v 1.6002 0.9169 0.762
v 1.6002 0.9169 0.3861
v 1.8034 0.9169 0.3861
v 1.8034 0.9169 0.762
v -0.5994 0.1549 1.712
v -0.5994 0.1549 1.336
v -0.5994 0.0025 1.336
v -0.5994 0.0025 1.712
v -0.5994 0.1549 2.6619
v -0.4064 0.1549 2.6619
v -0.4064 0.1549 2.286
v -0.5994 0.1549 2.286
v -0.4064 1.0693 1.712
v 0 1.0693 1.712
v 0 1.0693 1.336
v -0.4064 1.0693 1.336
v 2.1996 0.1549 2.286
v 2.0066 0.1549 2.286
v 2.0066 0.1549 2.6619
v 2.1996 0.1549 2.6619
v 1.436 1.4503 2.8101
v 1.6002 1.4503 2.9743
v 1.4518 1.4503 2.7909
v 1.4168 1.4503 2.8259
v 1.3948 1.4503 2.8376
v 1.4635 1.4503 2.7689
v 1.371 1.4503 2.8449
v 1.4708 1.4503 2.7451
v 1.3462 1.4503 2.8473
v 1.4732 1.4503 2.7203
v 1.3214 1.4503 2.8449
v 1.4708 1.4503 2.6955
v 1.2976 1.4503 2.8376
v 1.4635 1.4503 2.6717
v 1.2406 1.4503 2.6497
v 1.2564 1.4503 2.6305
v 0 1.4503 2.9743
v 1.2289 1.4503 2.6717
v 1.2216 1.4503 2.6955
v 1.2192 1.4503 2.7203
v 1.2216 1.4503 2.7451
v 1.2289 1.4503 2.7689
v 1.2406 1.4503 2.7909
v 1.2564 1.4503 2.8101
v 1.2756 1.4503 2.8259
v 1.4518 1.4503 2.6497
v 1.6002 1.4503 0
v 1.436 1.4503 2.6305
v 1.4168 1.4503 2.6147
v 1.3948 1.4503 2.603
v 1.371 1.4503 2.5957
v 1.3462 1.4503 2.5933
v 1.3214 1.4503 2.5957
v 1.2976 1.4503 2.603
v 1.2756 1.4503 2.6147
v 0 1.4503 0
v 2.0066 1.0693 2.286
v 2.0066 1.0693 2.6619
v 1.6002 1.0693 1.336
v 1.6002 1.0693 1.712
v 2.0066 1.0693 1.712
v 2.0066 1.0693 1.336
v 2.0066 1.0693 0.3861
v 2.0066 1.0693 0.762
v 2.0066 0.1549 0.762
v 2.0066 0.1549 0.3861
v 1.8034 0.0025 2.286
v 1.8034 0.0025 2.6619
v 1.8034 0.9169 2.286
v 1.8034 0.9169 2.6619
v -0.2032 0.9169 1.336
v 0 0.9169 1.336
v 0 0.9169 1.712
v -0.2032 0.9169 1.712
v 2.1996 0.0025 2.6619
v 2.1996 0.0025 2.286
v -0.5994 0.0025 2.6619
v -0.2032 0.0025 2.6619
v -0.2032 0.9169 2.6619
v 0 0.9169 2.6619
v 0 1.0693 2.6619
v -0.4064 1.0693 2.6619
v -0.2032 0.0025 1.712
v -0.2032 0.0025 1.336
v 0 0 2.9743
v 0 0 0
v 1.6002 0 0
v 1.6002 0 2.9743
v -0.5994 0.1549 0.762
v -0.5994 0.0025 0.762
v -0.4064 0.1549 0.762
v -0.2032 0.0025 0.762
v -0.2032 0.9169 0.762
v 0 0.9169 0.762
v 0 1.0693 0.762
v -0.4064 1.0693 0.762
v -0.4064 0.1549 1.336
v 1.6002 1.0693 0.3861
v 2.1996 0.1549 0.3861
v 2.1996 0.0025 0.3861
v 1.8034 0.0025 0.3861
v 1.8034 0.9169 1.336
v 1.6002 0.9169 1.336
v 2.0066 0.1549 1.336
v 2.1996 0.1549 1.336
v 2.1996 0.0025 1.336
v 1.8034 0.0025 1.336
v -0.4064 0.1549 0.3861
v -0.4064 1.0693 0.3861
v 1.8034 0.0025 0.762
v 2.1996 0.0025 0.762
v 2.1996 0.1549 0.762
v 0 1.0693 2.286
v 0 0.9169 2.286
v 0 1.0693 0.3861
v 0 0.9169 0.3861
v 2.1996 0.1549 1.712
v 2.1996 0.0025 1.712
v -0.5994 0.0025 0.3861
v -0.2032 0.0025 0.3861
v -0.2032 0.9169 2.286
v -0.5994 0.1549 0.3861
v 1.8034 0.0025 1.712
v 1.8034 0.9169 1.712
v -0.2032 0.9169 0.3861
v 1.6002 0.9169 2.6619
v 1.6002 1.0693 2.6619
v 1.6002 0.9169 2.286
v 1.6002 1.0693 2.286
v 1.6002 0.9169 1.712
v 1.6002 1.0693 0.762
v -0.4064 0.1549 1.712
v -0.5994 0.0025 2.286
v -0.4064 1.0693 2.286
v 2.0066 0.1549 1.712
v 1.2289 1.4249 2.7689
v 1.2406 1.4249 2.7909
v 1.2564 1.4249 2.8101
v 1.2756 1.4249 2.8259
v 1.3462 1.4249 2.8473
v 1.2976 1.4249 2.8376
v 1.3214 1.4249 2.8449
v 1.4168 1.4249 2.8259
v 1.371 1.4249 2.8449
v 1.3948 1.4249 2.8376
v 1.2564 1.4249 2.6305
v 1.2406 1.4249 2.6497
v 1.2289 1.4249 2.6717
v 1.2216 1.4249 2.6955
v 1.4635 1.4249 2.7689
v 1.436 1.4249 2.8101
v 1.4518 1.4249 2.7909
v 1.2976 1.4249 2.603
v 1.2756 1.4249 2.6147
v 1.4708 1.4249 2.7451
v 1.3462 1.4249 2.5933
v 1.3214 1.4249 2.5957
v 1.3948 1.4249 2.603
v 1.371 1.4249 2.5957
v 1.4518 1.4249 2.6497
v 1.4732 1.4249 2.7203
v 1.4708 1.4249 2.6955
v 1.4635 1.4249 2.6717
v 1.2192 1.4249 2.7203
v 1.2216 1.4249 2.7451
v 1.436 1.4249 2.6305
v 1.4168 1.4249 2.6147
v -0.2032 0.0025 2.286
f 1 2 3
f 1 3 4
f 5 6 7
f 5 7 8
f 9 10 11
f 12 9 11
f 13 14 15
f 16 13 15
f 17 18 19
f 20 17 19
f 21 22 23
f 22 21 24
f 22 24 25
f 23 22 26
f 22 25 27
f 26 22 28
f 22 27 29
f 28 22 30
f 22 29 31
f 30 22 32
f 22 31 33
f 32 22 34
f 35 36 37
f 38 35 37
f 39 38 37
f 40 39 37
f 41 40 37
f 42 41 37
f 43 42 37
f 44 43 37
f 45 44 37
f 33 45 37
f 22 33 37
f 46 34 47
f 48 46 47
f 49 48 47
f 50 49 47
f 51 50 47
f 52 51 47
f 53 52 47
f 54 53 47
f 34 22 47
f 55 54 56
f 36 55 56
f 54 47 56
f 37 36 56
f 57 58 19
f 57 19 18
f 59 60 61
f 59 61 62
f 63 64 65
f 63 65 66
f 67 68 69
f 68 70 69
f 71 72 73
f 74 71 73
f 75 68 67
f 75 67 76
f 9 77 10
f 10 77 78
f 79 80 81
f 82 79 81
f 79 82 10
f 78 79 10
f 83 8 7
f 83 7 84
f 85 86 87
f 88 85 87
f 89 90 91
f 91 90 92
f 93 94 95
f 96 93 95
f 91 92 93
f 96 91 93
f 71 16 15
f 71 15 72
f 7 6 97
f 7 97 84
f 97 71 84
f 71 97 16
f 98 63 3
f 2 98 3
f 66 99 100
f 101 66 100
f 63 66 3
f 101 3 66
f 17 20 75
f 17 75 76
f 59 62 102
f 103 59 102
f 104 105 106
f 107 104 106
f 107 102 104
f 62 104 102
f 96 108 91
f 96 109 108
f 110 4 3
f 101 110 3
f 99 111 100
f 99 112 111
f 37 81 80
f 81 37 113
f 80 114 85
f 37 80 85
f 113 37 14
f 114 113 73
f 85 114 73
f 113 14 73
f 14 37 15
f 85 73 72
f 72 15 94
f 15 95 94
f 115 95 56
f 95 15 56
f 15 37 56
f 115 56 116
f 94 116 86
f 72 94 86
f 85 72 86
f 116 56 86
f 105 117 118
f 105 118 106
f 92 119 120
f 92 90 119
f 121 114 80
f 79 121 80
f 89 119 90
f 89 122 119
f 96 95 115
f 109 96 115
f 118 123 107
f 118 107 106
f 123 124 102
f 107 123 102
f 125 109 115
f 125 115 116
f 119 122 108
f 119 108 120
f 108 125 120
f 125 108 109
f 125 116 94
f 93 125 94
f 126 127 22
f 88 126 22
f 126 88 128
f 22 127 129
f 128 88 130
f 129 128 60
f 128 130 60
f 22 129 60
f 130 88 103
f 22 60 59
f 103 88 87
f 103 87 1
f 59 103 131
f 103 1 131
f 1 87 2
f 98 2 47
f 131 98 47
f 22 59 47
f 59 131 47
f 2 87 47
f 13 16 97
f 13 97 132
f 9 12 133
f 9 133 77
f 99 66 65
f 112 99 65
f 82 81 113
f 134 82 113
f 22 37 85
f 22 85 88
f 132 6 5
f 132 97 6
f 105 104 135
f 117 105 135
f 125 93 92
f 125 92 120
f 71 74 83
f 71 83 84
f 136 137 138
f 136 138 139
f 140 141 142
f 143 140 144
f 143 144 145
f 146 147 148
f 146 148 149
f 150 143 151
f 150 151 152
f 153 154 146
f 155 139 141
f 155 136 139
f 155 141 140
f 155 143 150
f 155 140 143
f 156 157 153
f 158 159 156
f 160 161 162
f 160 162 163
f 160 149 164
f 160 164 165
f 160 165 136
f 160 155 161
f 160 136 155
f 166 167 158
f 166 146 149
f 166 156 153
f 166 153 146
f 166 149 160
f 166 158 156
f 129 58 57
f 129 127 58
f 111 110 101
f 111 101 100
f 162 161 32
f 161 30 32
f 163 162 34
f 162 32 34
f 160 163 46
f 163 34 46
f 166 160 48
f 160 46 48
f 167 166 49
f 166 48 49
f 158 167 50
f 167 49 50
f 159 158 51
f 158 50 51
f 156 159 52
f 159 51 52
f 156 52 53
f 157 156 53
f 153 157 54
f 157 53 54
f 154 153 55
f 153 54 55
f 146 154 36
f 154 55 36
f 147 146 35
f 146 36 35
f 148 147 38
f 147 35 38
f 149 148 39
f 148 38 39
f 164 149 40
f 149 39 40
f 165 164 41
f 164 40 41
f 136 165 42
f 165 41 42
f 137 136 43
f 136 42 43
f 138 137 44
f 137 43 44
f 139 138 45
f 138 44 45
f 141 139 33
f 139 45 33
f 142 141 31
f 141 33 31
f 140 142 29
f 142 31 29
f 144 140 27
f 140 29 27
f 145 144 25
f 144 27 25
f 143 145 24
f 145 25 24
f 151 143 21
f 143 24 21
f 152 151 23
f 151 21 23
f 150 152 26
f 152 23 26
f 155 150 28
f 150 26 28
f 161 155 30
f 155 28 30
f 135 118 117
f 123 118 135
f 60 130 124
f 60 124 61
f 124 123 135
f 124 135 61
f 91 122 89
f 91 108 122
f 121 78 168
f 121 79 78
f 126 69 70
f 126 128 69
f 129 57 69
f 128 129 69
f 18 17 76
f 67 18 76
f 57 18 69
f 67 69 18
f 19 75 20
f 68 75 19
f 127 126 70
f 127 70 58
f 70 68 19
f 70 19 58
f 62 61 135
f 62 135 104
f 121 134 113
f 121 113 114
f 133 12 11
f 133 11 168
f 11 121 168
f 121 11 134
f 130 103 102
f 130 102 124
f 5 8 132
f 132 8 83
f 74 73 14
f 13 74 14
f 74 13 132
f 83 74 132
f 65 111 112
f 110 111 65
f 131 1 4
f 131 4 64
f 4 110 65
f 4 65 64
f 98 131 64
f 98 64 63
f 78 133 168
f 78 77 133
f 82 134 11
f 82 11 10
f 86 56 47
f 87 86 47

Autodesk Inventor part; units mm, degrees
ref_plane "YZ Plane" through (0, 0, 0) normal (1, 0, 0) x (0, 1, 0)
ref_plane "XZ Plane" through (0, 0, 0) normal (0, 1, 0) x (-1, 0, 0)
ref_plane "XY Plane" through (0, 0, 0) normal (0, 0, 1) x (1, 0, 0)
sketch "Sketch1" plane through (0, 0, 0) normal (0, 0, 1) x (1, 0, 0)
  line L0 (0, 0) -> (1.6002, 0)
  line L1 (1.6002, 0) -> (1.6002, 1.4503)
  line L2 (1.6002, 1.4503) -> (0, 1.4503)
  line L3 (0, 1.4503) -> (0, 0)
  dimension "d0" = 1.6002
  dimension "d1" = 1.4503
extrude "Extrusion1" add sketch "Sketch1" along normal blind 2.9743
sketch "Sketch2" plane through (1.6002, 0, 0) normal (1, 0, 0) x (0, 0, -1)
  line L0 (-2.6619, 1.0693) -> (-2.286, 1.0693)
  line L1 (-2.286, 1.0693) -> (-2.286, 0.9169)
  line L2 (-2.286, 0.9169) -> (-2.6619, 0.9169)
  line L3 (-2.6619, 0.9169) -> (-2.6619, 1.0693)
  line L4 (0, 1.4503) -> (-2.9743, 1.4503) projected
  line L5 (-2.9743, 0) -> (-2.9743, 1.4503) projected
  line L6 (-1.712, 1.0693) -> (-1.336, 1.0693)
  line L7 (-1.336, 1.0693) -> (-1.336, 0.9169)
  line L8 (-1.336, 0.9169) -> (-1.712, 0.9169)
  line L9 (-1.712, 0.9169) -> (-1.712, 1.0693)
  line L10 (-0.762, 1.0693) -> (-0.3861, 1.0693)
  line L11 (-0.3861, 1.0693) -> (-0.3861, 0.9169)
  line L12 (-0.3861, 0.9169) -> (-0.762, 0.9169)
  line L13 (-0.762, 0.9169) -> (-0.762, 1.0693)
  point P0 (0, 0)
  dimension "d4" = 0.1524
  dimension "d5" = 0.3759
  dimension "d6" = 0.381
  dimension "d7" = 0.3124
  dimension "d10" = 0.95
extrude "Extrusion2" add sketch "Sketch2" along normal blind 0.254
extrude "Extrusion3" add sketch "Sketch2" against normal blind 1.8542
sketch "Sketch3" plane through (1.8542, 0, 0) normal (1, 0, 0) x (0, 0, -1)
  line L0 (-2.6619, 0.9169) -> (-2.286, 0.9169)
  line L1 (-2.286, 0.9169) -> (-2.286, 1.0693)
  line L2 (-2.286, 1.0693) -> (-2.6619, 1.0693)
  line L3 (-2.6619, 1.0693) -> (-2.6619, 0.9169)
  line L4 (-1.712, 0.9169) -> (-1.336, 0.9169)
  line L5 (-1.336, 0.9169) -> (-1.336, 1.0693)
  line L6 (-1.336, 1.0693) -> (-1.712, 1.0693)
  line L7 (-1.712, 1.0693) -> (-1.712, 0.9169)
  line L8 (-0.762, 0.9169) -> (-0.3861, 0.9169)
  line L9 (-0.3861, 0.9169) -> (-0.3861, 1.0693)
  line L10 (-0.3861, 1.0693) -> (-0.762, 1.0693)
  line L11 (-0.762, 1.0693) -> (-0.762, 0.9169)
  point P0 (0, 0)
extrude "Extrusion4" add sketch "Sketch3" along normal blind 0.1524
sketch "Sketch4" plane through (-0.254, 0, 0) normal (-1, 0, 0) x (0, 0, 1)
  line L0 (2.286, 1.0693) -> (2.6619, 1.0693)
  line L1 (2.6619, 1.0693) -> (2.6619, 0.9169)
  line L2 (2.6619, 0.9169) -> (2.286, 0.9169)
  line L3 (2.286, 0.9169) -> (2.286, 1.0693)
  line L4 (1.712, 1.0693) -> (1.336, 1.0693)
  line L5 (1.336, 1.0693) -> (1.336, 0.9169)
  line L6 (1.336, 0.9169) -> (1.712, 0.9169)
  line L7 (1.712, 0.9169) -> (1.712, 1.0693)
  line L8 (0.762, 1.0693) -> (0.3861, 1.0693)
  line L9 (0.3861, 1.0693) -> (0.3861, 0.9169)
  line L10 (0.3861, 0.9169) -> (0.762, 0.9169)
  line L11 (0.762, 0.9169) -> (0.762, 1.0693)
  point P0 (0, 0)
extrude "Extrusion5" add sketch "Sketch4" along normal blind 0.1524
sketch "Sketch5" plane through (0, 0.9169, 2.286) normal (0, -1, 0) x (1, 0, 0)
  line L0 (0, 0) -> (-0.4064, 0) projected
  line L1 (-0.4064, 0.3759) -> (-0.2032, 0.3759)
  line L2 (-0.2032, 0.3759) -> (-0.2032, 0)
  line L3 (-0.2032, 0) -> (-0.4064, 0)
  line L4 (-0.4064, 0) -> (-0.4064, 0.3759)
  line L5 (0, -0.95) -> (-0.4064, -0.95) projected
  line L6 (-0.4064, -0.574) -> (-0.2032, -0.574)
  line L7 (-0.2032, -0.574) -> (-0.2032, -0.95)
  line L8 (-0.2032, -0.95) -> (-0.4064, -0.95)
  line L9 (-0.4064, -0.95) -> (-0.4064, -0.574)
  line L10 (0, -1.8999) -> (-0.4064, -1.8999) projected
  line L11 (-0.4064, -1.524) -> (-0.2032, -1.524)
  line L12 (-0.2032, -1.524) -> (-0.2032, -1.8999)
  line L13 (-0.2032, -1.8999) -> (-0.4064, -1.8999)
  line L14 (-0.4064, -1.8999) -> (-0.4064, -1.524)
  line L15 (1.6002, 0) -> (2.0066, 0) projected
  line L16 (2.0066, 0.3759) -> (1.8034, 0.3759)
  line L17 (1.8034, 0.3759) -> (1.8034, 0)
  line L18 (1.8034, 0) -> (2.0066, 0)
  line L19 (2.0066, 0) -> (2.0066, 0.3759)
  line L20 (2.0066, -0.574) -> (1.8034, -0.574)
  line L21 (1.8034, -0.574) -> (1.8034, -0.95)
  line L22 (1.8034, -0.95) -> (2.0066, -0.95)
  line L23 (2.0066, -0.95) -> (2.0066, -0.574)
  line L24 (1.6002, -1.8999) -> (2.0066, -1.8999) projected
  line L25 (2.0066, -1.524) -> (1.8034, -1.524)
  line L26 (1.8034, -1.524) -> (1.8034, -1.8999)
  line L27 (1.8034, -1.8999) -> (2.0066, -1.8999)
  line L28 (2.0066, -1.8999) -> (2.0066, -1.524)
  point P0 (0, -2.286)
extrude "Extrusion6" add sketch "Sketch5" along normal blind 0.9144
sketch "Sketch6" plane through (2.0066, 0, 0) normal (1, 0, 0) x (0, 0, -1)
  line L0 (-2.286, 0.9169) -> (-2.286, 0.0025) projected
  line L1 (-2.6619, 0.0025) -> (-2.286, 0.0025)
  line L2 (-2.286, 0.0025) -> (-2.286, 0.1549)
  line L3 (-2.286, 0.1549) -> (-2.6619, 0.1549)
  line L4 (-2.6619, 0.1549) -> (-2.6619, 0.0025)
  line L5 (-1.336, 1.0693) -> (-1.336, 0.0025) projected
  line L6 (-1.712, 0.0025) -> (-1.336, 0.0025)
  line L7 (-1.336, 0.0025) -> (-1.336, 0.1549)
  line L8 (-1.336, 0.1549) -> (-1.712, 0.1549)
  line L9 (-1.712, 0.1549) -> (-1.712, 0.0025)
  line L10 (-0.3861, 1.0693) -> (-0.3861, 0.0025) projected
  line L11 (-0.762, 0.0025) -> (-0.3861, 0.0025)
  line L12 (-0.3861, 0.0025) -> (-0.3861, 0.1549)
  line L13 (-0.3861, 0.1549) -> (-0.762, 0.1549)
  line L14 (-0.762, 0.1549) -> (-0.762, 0.0025)
  point P0 (0, 0)
  dimension "d25" = 0.1524
extrude "Extrusion7" add sketch "Sketch6" along normal blind 0.193
sketch "Sketch7" plane through (-0.4064, 0, 0) normal (-1, 0, 0) x (0, 0, 1)
  line L0 (2.286, 0.0025) -> (2.6619, 0.0025)
  line L1 (2.6619, 0.0025) -> (2.6619, 0.1549)
  line L2 (2.6619, 0.1549) -> (2.286, 0.1549)
  line L3 (2.286, 0.1549) -> (2.286, 0.0025)
  line L4 (1.712, 0.0025) -> (1.336, 0.0025)
  line L5 (1.336, 0.0025) -> (1.336, 0.1549)
  line L6 (1.336, 0.1549) -> (1.712, 0.1549)
  line L7 (1.712, 0.1549) -> (1.712, 0.0025)
  line L8 (0.762, 0.0025) -> (0.3861, 0.0025)
  line L9 (0.3861, 0.0025) -> (0.3861, 0.1549)
  line L10 (0.3861, 0.1549) -> (0.762, 0.1549)
  line L11 (0.762, 0.1549) -> (0.762, 0.0025)
  point P0 (0, 0)
extrude "Extrusion8" add sketch "Sketch7" along normal blind 0.193
sketch "Sketch8" plane through (0, 1.4503, 0) normal (0, 1, 0) x (1, 0, 0)
  circle A0 centre (1.3462, -2.7203) radius 0.127
  line L0 (1.6002, 0) -> (1.6002, -2.9743) projected
  line L1 (1.6002, -2.9743) -> (0, -2.9743) projected
  point P0 (0, 0)
  dimension "d30" = 0.254
  dimension "d31" = 0.254
  dimension "d32" = 0.254
extrude "Extrusion9" cut sketch "Sketch8" against normal blind 0.0254
properties part number "74LVC2G14 Dual Inverter"
